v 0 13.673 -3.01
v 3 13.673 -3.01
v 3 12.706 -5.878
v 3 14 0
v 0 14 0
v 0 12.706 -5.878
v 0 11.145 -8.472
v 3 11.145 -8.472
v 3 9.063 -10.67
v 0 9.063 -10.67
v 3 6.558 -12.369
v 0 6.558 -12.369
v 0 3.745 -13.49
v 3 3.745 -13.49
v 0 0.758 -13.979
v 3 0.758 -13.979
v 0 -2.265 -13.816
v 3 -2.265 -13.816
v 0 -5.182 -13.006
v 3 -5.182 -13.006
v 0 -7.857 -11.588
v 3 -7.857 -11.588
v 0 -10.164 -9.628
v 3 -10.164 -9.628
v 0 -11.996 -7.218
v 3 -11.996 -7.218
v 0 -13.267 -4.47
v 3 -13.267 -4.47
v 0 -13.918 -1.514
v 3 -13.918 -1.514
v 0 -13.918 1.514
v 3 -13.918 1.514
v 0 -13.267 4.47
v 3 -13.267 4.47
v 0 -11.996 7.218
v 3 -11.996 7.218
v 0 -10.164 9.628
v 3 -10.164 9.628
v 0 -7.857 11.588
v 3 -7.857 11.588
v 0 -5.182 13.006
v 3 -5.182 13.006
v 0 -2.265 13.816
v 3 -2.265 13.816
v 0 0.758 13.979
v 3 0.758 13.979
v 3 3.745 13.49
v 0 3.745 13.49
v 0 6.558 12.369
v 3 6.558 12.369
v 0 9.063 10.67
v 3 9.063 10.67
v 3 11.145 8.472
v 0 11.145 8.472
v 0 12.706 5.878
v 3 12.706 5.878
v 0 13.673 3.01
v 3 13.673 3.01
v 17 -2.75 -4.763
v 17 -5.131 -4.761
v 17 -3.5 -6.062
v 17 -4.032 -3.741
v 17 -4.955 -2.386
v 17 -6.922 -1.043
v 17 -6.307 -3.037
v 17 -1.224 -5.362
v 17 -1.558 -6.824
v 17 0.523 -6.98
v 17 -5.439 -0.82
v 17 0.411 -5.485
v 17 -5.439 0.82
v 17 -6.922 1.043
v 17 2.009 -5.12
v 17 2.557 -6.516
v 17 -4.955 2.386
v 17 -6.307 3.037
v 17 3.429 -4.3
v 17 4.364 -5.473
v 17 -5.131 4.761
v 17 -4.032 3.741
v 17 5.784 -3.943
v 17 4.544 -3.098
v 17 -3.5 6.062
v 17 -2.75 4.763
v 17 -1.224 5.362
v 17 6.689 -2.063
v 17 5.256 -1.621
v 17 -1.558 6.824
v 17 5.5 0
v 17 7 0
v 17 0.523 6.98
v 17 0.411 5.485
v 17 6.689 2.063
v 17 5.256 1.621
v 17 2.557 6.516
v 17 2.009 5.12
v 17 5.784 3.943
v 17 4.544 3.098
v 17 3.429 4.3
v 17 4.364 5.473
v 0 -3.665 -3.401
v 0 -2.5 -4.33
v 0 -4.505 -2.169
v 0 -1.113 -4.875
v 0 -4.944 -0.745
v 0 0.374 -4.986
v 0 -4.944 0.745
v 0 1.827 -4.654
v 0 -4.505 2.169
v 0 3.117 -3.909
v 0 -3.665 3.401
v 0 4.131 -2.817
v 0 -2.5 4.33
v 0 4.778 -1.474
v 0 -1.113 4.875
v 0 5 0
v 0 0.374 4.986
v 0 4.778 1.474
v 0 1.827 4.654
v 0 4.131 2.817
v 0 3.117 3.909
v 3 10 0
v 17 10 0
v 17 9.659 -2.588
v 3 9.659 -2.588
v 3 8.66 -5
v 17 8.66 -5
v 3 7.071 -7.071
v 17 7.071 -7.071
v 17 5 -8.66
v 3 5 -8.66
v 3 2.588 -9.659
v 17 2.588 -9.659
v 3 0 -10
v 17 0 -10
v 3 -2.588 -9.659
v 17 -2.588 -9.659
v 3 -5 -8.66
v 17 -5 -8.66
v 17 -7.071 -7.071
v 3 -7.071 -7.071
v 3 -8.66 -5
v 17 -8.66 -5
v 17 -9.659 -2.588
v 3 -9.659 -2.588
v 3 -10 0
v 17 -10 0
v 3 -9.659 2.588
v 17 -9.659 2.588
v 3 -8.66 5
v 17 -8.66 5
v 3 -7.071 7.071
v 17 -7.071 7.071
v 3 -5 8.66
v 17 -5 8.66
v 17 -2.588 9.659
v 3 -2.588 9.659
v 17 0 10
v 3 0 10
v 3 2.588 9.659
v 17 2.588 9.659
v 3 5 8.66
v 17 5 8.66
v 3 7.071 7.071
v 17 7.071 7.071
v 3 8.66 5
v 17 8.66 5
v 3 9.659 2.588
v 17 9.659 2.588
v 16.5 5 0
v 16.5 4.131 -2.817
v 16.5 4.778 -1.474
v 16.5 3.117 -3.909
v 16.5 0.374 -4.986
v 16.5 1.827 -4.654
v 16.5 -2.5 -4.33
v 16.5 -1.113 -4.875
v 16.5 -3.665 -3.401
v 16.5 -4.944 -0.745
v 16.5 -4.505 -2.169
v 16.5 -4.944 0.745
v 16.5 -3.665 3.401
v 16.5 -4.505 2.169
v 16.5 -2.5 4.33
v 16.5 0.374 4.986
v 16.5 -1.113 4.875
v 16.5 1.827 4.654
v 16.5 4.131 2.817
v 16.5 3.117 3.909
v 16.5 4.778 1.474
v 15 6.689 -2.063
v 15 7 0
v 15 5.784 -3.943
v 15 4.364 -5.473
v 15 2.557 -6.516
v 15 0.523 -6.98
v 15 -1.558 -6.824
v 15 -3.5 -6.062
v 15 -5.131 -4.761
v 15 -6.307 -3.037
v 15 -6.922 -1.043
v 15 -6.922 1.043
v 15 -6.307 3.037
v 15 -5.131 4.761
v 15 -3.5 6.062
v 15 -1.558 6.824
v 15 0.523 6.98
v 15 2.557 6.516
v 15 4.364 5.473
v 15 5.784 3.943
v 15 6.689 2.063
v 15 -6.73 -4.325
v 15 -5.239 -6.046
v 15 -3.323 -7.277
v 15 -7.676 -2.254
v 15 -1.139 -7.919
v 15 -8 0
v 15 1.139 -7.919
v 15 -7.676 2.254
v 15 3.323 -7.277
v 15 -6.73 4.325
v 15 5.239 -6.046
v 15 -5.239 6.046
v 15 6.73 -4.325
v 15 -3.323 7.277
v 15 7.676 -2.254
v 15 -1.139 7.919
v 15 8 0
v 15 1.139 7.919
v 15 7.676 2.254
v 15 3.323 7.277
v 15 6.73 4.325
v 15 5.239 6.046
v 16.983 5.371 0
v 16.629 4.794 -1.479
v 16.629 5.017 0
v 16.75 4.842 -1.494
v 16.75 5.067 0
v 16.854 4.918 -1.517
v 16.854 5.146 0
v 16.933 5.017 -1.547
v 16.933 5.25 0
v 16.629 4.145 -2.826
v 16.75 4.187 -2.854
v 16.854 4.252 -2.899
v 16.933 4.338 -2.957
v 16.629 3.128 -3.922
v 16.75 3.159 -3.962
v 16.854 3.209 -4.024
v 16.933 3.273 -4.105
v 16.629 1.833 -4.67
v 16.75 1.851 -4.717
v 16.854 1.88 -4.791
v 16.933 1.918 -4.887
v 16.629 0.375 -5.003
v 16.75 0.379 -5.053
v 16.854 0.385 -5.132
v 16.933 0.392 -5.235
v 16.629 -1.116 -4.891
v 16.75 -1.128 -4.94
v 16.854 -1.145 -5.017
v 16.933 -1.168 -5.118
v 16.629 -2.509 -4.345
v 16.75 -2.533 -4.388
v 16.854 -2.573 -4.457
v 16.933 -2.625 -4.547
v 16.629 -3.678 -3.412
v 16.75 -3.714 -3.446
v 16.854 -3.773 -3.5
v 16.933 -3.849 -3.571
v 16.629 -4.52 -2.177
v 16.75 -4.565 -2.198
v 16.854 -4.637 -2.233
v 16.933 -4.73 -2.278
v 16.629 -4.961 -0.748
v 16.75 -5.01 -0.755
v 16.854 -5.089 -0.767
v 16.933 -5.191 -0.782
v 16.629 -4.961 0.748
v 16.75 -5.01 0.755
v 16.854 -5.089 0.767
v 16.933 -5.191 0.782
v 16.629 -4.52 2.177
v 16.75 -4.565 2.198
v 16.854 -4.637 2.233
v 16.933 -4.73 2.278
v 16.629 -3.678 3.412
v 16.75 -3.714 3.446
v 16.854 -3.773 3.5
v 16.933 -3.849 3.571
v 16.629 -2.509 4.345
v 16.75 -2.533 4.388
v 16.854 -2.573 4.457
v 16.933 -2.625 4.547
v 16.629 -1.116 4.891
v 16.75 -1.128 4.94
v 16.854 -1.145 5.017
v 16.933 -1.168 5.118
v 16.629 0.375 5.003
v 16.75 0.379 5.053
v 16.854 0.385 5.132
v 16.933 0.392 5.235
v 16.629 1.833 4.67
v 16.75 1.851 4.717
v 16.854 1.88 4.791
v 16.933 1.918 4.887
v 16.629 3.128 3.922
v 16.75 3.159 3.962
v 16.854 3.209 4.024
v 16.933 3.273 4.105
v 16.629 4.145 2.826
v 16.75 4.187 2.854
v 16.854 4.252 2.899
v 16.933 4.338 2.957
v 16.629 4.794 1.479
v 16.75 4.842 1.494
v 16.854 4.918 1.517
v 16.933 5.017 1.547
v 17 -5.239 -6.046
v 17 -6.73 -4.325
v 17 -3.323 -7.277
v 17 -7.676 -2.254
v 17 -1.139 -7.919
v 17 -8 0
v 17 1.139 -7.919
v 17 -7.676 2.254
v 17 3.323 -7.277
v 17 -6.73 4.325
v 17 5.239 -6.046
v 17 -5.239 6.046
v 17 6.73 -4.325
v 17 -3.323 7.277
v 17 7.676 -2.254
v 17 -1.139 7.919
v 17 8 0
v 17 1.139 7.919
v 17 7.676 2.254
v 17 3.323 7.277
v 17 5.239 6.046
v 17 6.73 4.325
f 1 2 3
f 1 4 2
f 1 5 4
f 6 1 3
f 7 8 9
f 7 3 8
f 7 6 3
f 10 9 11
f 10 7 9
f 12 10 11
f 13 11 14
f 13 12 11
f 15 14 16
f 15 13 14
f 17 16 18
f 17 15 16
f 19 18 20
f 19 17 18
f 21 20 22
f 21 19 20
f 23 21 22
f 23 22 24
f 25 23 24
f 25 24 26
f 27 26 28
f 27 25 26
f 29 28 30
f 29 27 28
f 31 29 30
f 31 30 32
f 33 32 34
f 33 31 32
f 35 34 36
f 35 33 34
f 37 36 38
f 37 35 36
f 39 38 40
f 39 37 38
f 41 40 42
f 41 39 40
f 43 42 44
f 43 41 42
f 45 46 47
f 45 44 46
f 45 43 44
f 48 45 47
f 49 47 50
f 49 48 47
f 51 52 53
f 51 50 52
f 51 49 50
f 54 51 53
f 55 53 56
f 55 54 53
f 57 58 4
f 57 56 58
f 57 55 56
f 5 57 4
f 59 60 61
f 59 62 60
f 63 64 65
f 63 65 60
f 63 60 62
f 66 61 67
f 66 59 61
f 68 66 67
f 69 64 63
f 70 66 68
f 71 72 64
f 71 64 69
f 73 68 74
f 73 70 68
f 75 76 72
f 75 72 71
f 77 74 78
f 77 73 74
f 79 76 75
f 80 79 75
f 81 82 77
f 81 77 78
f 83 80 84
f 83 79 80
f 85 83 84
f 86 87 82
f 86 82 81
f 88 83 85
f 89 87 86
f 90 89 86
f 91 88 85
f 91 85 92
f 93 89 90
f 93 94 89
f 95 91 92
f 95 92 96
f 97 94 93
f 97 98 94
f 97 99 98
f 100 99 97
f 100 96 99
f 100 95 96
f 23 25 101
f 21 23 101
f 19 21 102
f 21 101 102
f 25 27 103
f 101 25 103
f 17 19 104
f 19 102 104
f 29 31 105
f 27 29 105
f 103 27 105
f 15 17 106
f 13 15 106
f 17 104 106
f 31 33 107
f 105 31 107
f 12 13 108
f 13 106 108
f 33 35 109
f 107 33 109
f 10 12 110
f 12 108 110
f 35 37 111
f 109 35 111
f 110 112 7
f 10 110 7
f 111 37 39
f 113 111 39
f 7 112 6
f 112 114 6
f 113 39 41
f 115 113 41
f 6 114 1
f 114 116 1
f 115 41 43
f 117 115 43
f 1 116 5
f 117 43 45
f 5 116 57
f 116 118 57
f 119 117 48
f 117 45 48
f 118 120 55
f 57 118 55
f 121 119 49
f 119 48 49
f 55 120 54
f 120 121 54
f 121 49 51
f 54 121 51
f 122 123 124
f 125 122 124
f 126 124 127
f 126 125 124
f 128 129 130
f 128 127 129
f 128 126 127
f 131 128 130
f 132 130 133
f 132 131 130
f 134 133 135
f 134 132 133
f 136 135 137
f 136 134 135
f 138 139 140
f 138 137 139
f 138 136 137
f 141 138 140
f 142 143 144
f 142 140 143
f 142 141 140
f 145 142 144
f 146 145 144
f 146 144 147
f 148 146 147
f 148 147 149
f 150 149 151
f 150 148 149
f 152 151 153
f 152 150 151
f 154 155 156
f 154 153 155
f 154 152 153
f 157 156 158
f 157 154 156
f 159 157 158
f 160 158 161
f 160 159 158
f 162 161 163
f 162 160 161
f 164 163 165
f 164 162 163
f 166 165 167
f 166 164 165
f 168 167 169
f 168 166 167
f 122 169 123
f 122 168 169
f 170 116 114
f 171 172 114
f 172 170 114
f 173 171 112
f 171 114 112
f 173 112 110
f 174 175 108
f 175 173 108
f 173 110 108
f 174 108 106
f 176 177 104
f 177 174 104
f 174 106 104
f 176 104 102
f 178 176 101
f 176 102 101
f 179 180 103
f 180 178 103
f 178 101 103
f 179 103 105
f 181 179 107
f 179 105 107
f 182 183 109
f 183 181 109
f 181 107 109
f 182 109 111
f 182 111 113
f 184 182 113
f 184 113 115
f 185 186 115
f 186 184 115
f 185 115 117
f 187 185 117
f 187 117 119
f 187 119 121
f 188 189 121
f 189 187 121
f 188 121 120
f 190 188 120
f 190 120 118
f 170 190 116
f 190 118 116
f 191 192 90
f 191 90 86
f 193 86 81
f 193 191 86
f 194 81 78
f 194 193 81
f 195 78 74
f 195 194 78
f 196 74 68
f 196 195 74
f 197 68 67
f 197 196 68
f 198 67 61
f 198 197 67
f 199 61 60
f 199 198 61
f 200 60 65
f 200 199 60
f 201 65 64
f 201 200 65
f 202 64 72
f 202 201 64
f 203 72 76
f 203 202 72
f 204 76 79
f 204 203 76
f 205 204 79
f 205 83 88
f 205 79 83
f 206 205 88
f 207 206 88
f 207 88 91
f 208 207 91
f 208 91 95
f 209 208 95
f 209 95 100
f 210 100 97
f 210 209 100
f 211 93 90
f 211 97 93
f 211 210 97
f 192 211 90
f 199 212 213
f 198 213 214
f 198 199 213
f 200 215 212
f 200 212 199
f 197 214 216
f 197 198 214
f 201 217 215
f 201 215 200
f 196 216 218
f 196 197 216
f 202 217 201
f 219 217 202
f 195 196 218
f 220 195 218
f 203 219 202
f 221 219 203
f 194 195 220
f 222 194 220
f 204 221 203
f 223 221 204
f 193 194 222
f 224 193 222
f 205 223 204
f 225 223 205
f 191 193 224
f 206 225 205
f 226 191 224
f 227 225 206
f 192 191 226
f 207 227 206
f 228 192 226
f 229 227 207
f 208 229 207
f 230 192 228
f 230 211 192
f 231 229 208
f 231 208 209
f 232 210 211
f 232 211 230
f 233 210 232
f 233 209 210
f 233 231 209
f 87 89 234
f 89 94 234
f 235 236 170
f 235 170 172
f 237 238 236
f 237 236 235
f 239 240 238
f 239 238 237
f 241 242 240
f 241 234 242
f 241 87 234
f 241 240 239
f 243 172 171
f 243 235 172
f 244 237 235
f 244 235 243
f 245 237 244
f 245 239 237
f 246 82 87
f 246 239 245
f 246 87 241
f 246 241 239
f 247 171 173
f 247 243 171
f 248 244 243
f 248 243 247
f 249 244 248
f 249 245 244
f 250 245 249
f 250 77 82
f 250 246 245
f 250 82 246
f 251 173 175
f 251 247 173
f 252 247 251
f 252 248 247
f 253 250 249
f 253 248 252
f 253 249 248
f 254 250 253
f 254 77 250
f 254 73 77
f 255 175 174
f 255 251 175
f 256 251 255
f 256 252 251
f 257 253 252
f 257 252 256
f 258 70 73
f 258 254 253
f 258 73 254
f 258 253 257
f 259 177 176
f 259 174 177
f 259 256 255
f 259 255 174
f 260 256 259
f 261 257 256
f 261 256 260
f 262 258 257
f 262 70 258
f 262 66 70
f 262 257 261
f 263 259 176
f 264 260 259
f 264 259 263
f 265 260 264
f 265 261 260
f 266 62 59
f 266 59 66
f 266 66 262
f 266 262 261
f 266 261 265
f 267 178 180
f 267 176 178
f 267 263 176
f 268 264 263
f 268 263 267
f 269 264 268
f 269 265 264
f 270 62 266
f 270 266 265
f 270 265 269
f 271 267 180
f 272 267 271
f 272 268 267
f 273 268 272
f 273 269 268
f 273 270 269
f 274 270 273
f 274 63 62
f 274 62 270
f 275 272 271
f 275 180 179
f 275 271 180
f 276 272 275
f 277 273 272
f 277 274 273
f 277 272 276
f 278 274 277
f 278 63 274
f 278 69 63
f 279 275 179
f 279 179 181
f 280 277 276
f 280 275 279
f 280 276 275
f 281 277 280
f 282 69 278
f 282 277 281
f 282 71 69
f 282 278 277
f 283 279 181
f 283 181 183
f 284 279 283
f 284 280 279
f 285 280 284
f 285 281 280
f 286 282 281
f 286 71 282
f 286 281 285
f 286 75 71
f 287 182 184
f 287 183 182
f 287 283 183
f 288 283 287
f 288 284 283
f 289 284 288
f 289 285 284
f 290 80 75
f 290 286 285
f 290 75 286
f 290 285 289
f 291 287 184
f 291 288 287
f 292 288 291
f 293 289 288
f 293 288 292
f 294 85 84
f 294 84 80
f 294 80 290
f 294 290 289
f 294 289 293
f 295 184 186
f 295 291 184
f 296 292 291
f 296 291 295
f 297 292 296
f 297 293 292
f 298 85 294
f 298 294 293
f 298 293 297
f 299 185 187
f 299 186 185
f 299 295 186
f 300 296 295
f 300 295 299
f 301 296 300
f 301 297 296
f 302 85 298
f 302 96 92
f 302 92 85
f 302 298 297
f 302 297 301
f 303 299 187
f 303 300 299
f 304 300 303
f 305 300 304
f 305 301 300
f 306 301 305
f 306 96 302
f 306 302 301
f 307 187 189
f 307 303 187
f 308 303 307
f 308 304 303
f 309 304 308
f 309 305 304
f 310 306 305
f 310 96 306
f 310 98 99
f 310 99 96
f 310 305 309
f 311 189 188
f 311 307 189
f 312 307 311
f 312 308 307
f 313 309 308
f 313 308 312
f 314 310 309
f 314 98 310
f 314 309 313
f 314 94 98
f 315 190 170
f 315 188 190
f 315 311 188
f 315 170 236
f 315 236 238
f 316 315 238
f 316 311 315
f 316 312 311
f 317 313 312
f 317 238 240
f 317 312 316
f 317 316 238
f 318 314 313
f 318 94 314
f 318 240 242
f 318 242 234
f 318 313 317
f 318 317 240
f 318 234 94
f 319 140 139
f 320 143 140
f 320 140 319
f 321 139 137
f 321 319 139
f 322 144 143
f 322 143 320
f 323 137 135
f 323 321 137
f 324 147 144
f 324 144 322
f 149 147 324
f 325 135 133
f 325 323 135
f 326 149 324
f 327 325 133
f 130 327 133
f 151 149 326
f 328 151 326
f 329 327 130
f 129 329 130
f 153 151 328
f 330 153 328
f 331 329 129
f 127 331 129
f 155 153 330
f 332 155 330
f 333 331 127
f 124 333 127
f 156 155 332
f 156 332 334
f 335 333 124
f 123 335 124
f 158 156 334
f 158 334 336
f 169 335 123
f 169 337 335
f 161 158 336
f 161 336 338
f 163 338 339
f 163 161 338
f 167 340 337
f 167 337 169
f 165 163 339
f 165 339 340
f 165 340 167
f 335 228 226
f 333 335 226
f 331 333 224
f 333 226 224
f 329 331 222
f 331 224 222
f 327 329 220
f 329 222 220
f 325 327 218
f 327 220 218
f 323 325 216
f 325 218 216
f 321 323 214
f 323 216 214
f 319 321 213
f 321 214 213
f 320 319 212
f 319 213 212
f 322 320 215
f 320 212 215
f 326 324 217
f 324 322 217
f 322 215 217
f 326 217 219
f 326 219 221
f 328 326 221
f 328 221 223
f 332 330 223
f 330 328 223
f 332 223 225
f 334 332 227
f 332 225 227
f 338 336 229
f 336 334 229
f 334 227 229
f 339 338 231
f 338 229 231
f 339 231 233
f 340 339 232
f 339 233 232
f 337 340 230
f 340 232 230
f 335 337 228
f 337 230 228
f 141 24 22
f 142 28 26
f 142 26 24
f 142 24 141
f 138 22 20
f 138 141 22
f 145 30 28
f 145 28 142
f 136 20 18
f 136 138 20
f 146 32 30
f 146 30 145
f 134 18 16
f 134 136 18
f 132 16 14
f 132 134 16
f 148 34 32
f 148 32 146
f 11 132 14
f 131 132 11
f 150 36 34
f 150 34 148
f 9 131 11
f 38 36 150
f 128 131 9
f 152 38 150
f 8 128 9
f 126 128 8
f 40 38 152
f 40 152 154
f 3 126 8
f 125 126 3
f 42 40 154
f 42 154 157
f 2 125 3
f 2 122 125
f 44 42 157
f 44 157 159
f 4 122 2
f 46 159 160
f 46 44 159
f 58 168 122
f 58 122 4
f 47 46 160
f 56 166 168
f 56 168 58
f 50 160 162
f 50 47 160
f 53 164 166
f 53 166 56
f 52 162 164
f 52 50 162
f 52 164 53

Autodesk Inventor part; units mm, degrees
ref_plane "YZ Plane" through (0, 0, 0) normal (1, 0, 0) x (0, 1, 0)
ref_plane "XZ Plane" through (0, 0, 0) normal (0, 1, 0) x (-1, 0, 0)
ref_plane "XY Plane" through (0, 0, 0) normal (0, 0, 1) x (1, 0, 0)
sketch "スケッチ1" plane through (0, 0, 0) normal (1, 0, 0) x (0, 1, 0)
  circle A0 centre (0, 0) radius 5
  circle A1 centre (0, 0) radius 10
  circle A2 centre (0, 0) radius 8
  circle A3 centre (0, 0) radius 7
  circle A4 centre (0, 0) radius 14
  dimension "d0" = 10
  dimension "d1" = 20
  dimension "d2" = 2
  dimension "d8" = 2
  dimension "d9" = 28
extrude "押し出し1" add sketch "スケッチ1" along normal blind 17 contours A1 | A3
extrude "押し出し2" add sketch "スケッチ1" along normal blind 15 contours A2
fillet "フィレット1" radius 0.5 1 edges at (17, -5, 0)
extrude "押し出し3" add sketch "スケッチ1" along normal blind 3 contours A4
properties part number "myPartbasic"
